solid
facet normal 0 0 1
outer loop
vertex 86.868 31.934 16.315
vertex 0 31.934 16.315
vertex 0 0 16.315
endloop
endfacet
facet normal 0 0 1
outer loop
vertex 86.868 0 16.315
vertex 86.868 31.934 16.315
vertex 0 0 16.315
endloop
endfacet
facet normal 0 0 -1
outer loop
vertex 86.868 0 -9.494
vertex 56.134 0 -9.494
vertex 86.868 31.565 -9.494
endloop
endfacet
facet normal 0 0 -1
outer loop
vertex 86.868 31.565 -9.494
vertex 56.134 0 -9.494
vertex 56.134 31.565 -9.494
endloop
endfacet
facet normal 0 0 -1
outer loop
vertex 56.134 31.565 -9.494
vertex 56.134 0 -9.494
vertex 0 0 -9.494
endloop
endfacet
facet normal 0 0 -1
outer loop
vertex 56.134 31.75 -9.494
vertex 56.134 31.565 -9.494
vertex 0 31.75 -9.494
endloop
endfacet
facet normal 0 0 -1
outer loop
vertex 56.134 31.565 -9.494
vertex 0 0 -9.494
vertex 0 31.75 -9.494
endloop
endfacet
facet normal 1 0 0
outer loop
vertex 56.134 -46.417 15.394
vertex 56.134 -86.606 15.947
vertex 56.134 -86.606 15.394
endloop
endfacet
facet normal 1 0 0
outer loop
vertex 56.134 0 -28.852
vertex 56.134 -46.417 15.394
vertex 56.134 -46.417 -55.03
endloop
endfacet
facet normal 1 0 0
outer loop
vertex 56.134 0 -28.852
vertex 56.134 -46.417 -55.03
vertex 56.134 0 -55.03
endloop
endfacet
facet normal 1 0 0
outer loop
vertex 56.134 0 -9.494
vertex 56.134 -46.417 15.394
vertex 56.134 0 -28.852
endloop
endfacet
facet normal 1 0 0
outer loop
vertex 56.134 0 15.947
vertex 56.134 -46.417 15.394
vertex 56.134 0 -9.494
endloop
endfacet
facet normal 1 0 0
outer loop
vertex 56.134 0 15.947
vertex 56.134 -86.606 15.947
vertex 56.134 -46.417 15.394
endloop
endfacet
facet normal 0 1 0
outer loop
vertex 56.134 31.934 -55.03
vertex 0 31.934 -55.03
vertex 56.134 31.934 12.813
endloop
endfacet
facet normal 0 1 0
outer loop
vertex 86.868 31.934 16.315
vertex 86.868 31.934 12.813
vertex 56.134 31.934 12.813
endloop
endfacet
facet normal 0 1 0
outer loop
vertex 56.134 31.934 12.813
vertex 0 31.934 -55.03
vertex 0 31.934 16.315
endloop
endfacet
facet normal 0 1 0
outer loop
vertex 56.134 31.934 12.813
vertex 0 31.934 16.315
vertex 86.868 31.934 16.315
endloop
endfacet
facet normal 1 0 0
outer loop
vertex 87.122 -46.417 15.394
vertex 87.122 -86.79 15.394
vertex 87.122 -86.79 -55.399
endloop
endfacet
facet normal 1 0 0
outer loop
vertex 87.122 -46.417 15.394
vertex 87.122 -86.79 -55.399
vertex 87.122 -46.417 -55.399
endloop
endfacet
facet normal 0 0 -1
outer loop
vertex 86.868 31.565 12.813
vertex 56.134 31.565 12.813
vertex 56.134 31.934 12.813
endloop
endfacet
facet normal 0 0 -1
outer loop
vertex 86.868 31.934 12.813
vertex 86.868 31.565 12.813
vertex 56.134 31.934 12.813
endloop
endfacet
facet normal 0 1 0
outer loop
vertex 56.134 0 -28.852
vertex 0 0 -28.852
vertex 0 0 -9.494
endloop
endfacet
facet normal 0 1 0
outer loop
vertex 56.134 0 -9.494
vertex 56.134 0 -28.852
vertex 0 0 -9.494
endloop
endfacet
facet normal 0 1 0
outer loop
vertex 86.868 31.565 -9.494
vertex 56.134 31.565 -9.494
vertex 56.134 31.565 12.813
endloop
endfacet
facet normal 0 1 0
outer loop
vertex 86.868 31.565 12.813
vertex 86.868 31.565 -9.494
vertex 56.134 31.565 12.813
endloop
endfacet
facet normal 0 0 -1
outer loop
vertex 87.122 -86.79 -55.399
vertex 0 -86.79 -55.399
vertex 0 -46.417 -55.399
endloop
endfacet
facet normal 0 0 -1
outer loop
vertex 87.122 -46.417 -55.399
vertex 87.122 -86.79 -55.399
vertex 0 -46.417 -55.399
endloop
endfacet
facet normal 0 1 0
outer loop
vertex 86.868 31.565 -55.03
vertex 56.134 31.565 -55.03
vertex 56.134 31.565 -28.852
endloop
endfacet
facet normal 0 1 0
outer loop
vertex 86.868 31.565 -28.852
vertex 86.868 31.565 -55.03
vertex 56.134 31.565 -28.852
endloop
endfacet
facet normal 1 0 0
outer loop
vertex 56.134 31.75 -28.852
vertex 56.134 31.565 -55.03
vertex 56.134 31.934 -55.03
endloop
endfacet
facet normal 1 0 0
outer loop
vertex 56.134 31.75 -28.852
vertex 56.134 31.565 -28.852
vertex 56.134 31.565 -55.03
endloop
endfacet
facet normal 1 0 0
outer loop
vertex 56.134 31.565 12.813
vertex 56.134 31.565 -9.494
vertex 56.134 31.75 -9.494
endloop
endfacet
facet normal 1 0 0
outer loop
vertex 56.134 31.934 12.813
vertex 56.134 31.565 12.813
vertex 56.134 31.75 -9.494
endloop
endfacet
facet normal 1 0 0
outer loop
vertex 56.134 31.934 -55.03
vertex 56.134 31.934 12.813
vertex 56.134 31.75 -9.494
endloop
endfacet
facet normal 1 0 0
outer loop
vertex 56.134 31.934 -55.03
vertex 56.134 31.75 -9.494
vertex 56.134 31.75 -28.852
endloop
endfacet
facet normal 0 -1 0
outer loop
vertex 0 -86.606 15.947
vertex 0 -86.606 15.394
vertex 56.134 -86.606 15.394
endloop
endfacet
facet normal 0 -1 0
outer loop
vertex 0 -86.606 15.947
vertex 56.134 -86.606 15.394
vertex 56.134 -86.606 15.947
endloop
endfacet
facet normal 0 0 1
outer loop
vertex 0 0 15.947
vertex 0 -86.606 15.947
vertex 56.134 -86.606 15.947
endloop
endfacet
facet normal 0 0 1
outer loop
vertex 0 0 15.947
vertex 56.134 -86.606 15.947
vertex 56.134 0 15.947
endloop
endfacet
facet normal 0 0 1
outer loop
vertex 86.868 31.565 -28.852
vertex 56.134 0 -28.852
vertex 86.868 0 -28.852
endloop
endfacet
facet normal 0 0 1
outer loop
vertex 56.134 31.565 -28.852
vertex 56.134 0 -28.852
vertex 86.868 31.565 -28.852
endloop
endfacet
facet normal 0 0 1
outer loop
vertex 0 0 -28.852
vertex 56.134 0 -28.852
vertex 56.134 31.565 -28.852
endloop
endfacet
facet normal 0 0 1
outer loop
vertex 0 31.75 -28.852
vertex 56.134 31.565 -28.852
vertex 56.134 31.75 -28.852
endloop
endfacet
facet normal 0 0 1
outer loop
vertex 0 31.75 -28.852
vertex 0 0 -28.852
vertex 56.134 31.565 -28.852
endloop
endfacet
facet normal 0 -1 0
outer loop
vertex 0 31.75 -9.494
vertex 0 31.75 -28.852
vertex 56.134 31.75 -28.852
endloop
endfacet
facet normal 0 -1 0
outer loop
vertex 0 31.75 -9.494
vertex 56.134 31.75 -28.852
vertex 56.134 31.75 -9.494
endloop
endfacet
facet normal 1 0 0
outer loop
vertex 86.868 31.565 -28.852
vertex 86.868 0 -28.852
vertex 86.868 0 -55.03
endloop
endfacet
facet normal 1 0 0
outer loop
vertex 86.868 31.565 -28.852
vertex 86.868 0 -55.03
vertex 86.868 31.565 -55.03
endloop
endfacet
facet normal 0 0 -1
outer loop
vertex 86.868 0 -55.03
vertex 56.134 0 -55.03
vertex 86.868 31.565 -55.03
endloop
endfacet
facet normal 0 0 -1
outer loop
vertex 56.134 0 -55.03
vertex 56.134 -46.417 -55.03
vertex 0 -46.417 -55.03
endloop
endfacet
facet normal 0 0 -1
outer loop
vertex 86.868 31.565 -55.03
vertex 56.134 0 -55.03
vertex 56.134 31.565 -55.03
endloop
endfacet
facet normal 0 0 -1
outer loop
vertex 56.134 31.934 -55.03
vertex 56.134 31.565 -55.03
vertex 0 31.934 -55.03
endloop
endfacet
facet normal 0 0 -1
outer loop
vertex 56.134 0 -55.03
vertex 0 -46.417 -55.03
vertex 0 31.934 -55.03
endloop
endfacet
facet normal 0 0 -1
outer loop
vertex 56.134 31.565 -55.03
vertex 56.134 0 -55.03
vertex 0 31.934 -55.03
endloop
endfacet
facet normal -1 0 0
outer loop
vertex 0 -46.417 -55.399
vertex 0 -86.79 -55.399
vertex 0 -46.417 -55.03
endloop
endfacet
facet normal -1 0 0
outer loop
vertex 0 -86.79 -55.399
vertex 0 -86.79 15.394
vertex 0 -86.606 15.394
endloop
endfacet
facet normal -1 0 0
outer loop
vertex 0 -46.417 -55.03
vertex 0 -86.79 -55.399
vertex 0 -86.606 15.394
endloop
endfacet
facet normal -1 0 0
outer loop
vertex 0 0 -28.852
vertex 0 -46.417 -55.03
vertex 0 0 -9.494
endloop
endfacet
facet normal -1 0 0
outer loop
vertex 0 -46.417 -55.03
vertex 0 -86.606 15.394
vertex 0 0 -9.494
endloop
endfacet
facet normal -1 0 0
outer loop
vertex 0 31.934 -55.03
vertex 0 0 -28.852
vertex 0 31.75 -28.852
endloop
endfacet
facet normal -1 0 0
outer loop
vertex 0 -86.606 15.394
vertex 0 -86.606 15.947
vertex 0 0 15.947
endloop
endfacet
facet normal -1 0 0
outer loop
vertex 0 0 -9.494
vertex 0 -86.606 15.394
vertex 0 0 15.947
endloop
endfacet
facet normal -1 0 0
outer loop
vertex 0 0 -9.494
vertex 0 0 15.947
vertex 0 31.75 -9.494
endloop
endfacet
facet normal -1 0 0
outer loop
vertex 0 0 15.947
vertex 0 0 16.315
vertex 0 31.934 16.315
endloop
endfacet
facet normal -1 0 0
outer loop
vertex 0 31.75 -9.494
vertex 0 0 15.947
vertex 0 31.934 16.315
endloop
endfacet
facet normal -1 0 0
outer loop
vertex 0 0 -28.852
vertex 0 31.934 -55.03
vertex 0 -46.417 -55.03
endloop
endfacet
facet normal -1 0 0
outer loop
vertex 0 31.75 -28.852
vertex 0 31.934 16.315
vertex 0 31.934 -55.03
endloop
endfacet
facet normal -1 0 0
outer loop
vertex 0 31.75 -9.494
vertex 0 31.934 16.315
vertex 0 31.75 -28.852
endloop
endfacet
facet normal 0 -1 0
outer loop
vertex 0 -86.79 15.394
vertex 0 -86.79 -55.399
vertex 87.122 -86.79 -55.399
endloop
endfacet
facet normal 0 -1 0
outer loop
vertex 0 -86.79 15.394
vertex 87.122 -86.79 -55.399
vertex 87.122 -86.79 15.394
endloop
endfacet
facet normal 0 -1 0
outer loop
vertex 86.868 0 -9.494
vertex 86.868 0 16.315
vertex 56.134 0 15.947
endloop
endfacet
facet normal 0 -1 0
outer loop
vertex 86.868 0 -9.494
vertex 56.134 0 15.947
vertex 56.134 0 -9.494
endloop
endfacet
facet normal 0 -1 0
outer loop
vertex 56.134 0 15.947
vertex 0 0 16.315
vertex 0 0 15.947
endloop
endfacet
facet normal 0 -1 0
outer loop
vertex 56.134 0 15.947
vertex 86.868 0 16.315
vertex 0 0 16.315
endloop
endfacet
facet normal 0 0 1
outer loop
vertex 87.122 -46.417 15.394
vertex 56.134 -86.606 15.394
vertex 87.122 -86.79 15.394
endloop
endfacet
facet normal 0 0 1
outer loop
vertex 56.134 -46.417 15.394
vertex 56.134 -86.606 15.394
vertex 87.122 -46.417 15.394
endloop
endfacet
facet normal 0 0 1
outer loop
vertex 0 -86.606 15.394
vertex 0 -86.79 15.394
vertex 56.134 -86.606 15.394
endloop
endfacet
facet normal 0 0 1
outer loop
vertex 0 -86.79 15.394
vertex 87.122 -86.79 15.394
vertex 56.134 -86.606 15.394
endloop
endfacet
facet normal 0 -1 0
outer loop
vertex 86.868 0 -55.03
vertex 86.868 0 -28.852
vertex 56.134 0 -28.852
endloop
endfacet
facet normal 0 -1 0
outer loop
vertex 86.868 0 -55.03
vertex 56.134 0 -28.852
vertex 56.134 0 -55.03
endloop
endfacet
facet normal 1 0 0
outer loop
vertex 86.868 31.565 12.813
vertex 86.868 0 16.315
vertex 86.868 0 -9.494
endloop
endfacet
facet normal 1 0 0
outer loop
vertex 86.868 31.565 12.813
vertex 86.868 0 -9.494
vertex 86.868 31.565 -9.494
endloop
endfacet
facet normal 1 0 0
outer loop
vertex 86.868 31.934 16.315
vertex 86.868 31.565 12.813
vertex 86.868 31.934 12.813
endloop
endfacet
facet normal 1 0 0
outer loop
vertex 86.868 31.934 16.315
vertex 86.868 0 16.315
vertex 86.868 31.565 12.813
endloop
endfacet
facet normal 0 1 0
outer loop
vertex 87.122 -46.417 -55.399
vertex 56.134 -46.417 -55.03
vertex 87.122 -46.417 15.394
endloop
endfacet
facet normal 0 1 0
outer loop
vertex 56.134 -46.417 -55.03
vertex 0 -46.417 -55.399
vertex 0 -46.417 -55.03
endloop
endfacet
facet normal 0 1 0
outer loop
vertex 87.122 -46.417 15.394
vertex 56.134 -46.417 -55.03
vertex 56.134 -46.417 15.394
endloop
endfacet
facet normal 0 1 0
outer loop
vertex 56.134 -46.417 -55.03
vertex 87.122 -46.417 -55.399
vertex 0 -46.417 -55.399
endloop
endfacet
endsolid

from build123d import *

# Parameters (mm, degrees)
F0_W     = 118.5401678085
F0_H     = 70.9766112268
F1_DEPTH = 56.134
F2_W     = 40.3737127781
F2_H     = 70.7922605798
F3_DEPTH = 87.122
F4_W     = 31.5654948354
F4_H     = 3.5027423874
F4_W_2   = 0.3687143326
F4_H_2   = 67.8425794467
F5_DEPTH = 86.868
F6_W     = 31.7498482764
F6_H     = 19.3572575226
F7_DEPTH = 92.71


with BuildPart() as f1:
    # F0 (on Right) → F1 (new body)
    with BuildSketch(Plane.YZ):
        with Locations((-27.3358747363, -19.541611895)):
            Rectangle(F0_W, F0_H)
    extrude(amount=F1_DEPTH)

    # F2 (on Right) → F3 (join)
    with BuildSketch(Plane.YZ):
        with Locations((-66.6034594178, -20.0025015511)):
            Rectangle(F2_W, F2_H)
    extrude(amount=F3_DEPTH)

    # F4 (on Right) → F5 (join)
    with BuildSketch(Plane.YZ):
        with Locations((15.7827474177, 14.564033132)):
            Rectangle(F4_W, F4_H)
        with Locations((31.7498520017, 14.564033132)):
            Rectangle(F4_W_2, F4_H)
        with Locations((15.7827474177, -21.108627785)):
            Rectangle(F4_W, F4_H_2)
    extrude(amount=F5_DEPTH)

    # F6 (on Right) → F7 (cut)
    with BuildSketch(Plane.YZ):
        with Locations((15.8749241382, -19.1729026847)):
            Rectangle(F6_W, F6_H)
    extrude(amount=F7_DEPTH, mode=Mode.SUBTRACT)


solid = f1.part
